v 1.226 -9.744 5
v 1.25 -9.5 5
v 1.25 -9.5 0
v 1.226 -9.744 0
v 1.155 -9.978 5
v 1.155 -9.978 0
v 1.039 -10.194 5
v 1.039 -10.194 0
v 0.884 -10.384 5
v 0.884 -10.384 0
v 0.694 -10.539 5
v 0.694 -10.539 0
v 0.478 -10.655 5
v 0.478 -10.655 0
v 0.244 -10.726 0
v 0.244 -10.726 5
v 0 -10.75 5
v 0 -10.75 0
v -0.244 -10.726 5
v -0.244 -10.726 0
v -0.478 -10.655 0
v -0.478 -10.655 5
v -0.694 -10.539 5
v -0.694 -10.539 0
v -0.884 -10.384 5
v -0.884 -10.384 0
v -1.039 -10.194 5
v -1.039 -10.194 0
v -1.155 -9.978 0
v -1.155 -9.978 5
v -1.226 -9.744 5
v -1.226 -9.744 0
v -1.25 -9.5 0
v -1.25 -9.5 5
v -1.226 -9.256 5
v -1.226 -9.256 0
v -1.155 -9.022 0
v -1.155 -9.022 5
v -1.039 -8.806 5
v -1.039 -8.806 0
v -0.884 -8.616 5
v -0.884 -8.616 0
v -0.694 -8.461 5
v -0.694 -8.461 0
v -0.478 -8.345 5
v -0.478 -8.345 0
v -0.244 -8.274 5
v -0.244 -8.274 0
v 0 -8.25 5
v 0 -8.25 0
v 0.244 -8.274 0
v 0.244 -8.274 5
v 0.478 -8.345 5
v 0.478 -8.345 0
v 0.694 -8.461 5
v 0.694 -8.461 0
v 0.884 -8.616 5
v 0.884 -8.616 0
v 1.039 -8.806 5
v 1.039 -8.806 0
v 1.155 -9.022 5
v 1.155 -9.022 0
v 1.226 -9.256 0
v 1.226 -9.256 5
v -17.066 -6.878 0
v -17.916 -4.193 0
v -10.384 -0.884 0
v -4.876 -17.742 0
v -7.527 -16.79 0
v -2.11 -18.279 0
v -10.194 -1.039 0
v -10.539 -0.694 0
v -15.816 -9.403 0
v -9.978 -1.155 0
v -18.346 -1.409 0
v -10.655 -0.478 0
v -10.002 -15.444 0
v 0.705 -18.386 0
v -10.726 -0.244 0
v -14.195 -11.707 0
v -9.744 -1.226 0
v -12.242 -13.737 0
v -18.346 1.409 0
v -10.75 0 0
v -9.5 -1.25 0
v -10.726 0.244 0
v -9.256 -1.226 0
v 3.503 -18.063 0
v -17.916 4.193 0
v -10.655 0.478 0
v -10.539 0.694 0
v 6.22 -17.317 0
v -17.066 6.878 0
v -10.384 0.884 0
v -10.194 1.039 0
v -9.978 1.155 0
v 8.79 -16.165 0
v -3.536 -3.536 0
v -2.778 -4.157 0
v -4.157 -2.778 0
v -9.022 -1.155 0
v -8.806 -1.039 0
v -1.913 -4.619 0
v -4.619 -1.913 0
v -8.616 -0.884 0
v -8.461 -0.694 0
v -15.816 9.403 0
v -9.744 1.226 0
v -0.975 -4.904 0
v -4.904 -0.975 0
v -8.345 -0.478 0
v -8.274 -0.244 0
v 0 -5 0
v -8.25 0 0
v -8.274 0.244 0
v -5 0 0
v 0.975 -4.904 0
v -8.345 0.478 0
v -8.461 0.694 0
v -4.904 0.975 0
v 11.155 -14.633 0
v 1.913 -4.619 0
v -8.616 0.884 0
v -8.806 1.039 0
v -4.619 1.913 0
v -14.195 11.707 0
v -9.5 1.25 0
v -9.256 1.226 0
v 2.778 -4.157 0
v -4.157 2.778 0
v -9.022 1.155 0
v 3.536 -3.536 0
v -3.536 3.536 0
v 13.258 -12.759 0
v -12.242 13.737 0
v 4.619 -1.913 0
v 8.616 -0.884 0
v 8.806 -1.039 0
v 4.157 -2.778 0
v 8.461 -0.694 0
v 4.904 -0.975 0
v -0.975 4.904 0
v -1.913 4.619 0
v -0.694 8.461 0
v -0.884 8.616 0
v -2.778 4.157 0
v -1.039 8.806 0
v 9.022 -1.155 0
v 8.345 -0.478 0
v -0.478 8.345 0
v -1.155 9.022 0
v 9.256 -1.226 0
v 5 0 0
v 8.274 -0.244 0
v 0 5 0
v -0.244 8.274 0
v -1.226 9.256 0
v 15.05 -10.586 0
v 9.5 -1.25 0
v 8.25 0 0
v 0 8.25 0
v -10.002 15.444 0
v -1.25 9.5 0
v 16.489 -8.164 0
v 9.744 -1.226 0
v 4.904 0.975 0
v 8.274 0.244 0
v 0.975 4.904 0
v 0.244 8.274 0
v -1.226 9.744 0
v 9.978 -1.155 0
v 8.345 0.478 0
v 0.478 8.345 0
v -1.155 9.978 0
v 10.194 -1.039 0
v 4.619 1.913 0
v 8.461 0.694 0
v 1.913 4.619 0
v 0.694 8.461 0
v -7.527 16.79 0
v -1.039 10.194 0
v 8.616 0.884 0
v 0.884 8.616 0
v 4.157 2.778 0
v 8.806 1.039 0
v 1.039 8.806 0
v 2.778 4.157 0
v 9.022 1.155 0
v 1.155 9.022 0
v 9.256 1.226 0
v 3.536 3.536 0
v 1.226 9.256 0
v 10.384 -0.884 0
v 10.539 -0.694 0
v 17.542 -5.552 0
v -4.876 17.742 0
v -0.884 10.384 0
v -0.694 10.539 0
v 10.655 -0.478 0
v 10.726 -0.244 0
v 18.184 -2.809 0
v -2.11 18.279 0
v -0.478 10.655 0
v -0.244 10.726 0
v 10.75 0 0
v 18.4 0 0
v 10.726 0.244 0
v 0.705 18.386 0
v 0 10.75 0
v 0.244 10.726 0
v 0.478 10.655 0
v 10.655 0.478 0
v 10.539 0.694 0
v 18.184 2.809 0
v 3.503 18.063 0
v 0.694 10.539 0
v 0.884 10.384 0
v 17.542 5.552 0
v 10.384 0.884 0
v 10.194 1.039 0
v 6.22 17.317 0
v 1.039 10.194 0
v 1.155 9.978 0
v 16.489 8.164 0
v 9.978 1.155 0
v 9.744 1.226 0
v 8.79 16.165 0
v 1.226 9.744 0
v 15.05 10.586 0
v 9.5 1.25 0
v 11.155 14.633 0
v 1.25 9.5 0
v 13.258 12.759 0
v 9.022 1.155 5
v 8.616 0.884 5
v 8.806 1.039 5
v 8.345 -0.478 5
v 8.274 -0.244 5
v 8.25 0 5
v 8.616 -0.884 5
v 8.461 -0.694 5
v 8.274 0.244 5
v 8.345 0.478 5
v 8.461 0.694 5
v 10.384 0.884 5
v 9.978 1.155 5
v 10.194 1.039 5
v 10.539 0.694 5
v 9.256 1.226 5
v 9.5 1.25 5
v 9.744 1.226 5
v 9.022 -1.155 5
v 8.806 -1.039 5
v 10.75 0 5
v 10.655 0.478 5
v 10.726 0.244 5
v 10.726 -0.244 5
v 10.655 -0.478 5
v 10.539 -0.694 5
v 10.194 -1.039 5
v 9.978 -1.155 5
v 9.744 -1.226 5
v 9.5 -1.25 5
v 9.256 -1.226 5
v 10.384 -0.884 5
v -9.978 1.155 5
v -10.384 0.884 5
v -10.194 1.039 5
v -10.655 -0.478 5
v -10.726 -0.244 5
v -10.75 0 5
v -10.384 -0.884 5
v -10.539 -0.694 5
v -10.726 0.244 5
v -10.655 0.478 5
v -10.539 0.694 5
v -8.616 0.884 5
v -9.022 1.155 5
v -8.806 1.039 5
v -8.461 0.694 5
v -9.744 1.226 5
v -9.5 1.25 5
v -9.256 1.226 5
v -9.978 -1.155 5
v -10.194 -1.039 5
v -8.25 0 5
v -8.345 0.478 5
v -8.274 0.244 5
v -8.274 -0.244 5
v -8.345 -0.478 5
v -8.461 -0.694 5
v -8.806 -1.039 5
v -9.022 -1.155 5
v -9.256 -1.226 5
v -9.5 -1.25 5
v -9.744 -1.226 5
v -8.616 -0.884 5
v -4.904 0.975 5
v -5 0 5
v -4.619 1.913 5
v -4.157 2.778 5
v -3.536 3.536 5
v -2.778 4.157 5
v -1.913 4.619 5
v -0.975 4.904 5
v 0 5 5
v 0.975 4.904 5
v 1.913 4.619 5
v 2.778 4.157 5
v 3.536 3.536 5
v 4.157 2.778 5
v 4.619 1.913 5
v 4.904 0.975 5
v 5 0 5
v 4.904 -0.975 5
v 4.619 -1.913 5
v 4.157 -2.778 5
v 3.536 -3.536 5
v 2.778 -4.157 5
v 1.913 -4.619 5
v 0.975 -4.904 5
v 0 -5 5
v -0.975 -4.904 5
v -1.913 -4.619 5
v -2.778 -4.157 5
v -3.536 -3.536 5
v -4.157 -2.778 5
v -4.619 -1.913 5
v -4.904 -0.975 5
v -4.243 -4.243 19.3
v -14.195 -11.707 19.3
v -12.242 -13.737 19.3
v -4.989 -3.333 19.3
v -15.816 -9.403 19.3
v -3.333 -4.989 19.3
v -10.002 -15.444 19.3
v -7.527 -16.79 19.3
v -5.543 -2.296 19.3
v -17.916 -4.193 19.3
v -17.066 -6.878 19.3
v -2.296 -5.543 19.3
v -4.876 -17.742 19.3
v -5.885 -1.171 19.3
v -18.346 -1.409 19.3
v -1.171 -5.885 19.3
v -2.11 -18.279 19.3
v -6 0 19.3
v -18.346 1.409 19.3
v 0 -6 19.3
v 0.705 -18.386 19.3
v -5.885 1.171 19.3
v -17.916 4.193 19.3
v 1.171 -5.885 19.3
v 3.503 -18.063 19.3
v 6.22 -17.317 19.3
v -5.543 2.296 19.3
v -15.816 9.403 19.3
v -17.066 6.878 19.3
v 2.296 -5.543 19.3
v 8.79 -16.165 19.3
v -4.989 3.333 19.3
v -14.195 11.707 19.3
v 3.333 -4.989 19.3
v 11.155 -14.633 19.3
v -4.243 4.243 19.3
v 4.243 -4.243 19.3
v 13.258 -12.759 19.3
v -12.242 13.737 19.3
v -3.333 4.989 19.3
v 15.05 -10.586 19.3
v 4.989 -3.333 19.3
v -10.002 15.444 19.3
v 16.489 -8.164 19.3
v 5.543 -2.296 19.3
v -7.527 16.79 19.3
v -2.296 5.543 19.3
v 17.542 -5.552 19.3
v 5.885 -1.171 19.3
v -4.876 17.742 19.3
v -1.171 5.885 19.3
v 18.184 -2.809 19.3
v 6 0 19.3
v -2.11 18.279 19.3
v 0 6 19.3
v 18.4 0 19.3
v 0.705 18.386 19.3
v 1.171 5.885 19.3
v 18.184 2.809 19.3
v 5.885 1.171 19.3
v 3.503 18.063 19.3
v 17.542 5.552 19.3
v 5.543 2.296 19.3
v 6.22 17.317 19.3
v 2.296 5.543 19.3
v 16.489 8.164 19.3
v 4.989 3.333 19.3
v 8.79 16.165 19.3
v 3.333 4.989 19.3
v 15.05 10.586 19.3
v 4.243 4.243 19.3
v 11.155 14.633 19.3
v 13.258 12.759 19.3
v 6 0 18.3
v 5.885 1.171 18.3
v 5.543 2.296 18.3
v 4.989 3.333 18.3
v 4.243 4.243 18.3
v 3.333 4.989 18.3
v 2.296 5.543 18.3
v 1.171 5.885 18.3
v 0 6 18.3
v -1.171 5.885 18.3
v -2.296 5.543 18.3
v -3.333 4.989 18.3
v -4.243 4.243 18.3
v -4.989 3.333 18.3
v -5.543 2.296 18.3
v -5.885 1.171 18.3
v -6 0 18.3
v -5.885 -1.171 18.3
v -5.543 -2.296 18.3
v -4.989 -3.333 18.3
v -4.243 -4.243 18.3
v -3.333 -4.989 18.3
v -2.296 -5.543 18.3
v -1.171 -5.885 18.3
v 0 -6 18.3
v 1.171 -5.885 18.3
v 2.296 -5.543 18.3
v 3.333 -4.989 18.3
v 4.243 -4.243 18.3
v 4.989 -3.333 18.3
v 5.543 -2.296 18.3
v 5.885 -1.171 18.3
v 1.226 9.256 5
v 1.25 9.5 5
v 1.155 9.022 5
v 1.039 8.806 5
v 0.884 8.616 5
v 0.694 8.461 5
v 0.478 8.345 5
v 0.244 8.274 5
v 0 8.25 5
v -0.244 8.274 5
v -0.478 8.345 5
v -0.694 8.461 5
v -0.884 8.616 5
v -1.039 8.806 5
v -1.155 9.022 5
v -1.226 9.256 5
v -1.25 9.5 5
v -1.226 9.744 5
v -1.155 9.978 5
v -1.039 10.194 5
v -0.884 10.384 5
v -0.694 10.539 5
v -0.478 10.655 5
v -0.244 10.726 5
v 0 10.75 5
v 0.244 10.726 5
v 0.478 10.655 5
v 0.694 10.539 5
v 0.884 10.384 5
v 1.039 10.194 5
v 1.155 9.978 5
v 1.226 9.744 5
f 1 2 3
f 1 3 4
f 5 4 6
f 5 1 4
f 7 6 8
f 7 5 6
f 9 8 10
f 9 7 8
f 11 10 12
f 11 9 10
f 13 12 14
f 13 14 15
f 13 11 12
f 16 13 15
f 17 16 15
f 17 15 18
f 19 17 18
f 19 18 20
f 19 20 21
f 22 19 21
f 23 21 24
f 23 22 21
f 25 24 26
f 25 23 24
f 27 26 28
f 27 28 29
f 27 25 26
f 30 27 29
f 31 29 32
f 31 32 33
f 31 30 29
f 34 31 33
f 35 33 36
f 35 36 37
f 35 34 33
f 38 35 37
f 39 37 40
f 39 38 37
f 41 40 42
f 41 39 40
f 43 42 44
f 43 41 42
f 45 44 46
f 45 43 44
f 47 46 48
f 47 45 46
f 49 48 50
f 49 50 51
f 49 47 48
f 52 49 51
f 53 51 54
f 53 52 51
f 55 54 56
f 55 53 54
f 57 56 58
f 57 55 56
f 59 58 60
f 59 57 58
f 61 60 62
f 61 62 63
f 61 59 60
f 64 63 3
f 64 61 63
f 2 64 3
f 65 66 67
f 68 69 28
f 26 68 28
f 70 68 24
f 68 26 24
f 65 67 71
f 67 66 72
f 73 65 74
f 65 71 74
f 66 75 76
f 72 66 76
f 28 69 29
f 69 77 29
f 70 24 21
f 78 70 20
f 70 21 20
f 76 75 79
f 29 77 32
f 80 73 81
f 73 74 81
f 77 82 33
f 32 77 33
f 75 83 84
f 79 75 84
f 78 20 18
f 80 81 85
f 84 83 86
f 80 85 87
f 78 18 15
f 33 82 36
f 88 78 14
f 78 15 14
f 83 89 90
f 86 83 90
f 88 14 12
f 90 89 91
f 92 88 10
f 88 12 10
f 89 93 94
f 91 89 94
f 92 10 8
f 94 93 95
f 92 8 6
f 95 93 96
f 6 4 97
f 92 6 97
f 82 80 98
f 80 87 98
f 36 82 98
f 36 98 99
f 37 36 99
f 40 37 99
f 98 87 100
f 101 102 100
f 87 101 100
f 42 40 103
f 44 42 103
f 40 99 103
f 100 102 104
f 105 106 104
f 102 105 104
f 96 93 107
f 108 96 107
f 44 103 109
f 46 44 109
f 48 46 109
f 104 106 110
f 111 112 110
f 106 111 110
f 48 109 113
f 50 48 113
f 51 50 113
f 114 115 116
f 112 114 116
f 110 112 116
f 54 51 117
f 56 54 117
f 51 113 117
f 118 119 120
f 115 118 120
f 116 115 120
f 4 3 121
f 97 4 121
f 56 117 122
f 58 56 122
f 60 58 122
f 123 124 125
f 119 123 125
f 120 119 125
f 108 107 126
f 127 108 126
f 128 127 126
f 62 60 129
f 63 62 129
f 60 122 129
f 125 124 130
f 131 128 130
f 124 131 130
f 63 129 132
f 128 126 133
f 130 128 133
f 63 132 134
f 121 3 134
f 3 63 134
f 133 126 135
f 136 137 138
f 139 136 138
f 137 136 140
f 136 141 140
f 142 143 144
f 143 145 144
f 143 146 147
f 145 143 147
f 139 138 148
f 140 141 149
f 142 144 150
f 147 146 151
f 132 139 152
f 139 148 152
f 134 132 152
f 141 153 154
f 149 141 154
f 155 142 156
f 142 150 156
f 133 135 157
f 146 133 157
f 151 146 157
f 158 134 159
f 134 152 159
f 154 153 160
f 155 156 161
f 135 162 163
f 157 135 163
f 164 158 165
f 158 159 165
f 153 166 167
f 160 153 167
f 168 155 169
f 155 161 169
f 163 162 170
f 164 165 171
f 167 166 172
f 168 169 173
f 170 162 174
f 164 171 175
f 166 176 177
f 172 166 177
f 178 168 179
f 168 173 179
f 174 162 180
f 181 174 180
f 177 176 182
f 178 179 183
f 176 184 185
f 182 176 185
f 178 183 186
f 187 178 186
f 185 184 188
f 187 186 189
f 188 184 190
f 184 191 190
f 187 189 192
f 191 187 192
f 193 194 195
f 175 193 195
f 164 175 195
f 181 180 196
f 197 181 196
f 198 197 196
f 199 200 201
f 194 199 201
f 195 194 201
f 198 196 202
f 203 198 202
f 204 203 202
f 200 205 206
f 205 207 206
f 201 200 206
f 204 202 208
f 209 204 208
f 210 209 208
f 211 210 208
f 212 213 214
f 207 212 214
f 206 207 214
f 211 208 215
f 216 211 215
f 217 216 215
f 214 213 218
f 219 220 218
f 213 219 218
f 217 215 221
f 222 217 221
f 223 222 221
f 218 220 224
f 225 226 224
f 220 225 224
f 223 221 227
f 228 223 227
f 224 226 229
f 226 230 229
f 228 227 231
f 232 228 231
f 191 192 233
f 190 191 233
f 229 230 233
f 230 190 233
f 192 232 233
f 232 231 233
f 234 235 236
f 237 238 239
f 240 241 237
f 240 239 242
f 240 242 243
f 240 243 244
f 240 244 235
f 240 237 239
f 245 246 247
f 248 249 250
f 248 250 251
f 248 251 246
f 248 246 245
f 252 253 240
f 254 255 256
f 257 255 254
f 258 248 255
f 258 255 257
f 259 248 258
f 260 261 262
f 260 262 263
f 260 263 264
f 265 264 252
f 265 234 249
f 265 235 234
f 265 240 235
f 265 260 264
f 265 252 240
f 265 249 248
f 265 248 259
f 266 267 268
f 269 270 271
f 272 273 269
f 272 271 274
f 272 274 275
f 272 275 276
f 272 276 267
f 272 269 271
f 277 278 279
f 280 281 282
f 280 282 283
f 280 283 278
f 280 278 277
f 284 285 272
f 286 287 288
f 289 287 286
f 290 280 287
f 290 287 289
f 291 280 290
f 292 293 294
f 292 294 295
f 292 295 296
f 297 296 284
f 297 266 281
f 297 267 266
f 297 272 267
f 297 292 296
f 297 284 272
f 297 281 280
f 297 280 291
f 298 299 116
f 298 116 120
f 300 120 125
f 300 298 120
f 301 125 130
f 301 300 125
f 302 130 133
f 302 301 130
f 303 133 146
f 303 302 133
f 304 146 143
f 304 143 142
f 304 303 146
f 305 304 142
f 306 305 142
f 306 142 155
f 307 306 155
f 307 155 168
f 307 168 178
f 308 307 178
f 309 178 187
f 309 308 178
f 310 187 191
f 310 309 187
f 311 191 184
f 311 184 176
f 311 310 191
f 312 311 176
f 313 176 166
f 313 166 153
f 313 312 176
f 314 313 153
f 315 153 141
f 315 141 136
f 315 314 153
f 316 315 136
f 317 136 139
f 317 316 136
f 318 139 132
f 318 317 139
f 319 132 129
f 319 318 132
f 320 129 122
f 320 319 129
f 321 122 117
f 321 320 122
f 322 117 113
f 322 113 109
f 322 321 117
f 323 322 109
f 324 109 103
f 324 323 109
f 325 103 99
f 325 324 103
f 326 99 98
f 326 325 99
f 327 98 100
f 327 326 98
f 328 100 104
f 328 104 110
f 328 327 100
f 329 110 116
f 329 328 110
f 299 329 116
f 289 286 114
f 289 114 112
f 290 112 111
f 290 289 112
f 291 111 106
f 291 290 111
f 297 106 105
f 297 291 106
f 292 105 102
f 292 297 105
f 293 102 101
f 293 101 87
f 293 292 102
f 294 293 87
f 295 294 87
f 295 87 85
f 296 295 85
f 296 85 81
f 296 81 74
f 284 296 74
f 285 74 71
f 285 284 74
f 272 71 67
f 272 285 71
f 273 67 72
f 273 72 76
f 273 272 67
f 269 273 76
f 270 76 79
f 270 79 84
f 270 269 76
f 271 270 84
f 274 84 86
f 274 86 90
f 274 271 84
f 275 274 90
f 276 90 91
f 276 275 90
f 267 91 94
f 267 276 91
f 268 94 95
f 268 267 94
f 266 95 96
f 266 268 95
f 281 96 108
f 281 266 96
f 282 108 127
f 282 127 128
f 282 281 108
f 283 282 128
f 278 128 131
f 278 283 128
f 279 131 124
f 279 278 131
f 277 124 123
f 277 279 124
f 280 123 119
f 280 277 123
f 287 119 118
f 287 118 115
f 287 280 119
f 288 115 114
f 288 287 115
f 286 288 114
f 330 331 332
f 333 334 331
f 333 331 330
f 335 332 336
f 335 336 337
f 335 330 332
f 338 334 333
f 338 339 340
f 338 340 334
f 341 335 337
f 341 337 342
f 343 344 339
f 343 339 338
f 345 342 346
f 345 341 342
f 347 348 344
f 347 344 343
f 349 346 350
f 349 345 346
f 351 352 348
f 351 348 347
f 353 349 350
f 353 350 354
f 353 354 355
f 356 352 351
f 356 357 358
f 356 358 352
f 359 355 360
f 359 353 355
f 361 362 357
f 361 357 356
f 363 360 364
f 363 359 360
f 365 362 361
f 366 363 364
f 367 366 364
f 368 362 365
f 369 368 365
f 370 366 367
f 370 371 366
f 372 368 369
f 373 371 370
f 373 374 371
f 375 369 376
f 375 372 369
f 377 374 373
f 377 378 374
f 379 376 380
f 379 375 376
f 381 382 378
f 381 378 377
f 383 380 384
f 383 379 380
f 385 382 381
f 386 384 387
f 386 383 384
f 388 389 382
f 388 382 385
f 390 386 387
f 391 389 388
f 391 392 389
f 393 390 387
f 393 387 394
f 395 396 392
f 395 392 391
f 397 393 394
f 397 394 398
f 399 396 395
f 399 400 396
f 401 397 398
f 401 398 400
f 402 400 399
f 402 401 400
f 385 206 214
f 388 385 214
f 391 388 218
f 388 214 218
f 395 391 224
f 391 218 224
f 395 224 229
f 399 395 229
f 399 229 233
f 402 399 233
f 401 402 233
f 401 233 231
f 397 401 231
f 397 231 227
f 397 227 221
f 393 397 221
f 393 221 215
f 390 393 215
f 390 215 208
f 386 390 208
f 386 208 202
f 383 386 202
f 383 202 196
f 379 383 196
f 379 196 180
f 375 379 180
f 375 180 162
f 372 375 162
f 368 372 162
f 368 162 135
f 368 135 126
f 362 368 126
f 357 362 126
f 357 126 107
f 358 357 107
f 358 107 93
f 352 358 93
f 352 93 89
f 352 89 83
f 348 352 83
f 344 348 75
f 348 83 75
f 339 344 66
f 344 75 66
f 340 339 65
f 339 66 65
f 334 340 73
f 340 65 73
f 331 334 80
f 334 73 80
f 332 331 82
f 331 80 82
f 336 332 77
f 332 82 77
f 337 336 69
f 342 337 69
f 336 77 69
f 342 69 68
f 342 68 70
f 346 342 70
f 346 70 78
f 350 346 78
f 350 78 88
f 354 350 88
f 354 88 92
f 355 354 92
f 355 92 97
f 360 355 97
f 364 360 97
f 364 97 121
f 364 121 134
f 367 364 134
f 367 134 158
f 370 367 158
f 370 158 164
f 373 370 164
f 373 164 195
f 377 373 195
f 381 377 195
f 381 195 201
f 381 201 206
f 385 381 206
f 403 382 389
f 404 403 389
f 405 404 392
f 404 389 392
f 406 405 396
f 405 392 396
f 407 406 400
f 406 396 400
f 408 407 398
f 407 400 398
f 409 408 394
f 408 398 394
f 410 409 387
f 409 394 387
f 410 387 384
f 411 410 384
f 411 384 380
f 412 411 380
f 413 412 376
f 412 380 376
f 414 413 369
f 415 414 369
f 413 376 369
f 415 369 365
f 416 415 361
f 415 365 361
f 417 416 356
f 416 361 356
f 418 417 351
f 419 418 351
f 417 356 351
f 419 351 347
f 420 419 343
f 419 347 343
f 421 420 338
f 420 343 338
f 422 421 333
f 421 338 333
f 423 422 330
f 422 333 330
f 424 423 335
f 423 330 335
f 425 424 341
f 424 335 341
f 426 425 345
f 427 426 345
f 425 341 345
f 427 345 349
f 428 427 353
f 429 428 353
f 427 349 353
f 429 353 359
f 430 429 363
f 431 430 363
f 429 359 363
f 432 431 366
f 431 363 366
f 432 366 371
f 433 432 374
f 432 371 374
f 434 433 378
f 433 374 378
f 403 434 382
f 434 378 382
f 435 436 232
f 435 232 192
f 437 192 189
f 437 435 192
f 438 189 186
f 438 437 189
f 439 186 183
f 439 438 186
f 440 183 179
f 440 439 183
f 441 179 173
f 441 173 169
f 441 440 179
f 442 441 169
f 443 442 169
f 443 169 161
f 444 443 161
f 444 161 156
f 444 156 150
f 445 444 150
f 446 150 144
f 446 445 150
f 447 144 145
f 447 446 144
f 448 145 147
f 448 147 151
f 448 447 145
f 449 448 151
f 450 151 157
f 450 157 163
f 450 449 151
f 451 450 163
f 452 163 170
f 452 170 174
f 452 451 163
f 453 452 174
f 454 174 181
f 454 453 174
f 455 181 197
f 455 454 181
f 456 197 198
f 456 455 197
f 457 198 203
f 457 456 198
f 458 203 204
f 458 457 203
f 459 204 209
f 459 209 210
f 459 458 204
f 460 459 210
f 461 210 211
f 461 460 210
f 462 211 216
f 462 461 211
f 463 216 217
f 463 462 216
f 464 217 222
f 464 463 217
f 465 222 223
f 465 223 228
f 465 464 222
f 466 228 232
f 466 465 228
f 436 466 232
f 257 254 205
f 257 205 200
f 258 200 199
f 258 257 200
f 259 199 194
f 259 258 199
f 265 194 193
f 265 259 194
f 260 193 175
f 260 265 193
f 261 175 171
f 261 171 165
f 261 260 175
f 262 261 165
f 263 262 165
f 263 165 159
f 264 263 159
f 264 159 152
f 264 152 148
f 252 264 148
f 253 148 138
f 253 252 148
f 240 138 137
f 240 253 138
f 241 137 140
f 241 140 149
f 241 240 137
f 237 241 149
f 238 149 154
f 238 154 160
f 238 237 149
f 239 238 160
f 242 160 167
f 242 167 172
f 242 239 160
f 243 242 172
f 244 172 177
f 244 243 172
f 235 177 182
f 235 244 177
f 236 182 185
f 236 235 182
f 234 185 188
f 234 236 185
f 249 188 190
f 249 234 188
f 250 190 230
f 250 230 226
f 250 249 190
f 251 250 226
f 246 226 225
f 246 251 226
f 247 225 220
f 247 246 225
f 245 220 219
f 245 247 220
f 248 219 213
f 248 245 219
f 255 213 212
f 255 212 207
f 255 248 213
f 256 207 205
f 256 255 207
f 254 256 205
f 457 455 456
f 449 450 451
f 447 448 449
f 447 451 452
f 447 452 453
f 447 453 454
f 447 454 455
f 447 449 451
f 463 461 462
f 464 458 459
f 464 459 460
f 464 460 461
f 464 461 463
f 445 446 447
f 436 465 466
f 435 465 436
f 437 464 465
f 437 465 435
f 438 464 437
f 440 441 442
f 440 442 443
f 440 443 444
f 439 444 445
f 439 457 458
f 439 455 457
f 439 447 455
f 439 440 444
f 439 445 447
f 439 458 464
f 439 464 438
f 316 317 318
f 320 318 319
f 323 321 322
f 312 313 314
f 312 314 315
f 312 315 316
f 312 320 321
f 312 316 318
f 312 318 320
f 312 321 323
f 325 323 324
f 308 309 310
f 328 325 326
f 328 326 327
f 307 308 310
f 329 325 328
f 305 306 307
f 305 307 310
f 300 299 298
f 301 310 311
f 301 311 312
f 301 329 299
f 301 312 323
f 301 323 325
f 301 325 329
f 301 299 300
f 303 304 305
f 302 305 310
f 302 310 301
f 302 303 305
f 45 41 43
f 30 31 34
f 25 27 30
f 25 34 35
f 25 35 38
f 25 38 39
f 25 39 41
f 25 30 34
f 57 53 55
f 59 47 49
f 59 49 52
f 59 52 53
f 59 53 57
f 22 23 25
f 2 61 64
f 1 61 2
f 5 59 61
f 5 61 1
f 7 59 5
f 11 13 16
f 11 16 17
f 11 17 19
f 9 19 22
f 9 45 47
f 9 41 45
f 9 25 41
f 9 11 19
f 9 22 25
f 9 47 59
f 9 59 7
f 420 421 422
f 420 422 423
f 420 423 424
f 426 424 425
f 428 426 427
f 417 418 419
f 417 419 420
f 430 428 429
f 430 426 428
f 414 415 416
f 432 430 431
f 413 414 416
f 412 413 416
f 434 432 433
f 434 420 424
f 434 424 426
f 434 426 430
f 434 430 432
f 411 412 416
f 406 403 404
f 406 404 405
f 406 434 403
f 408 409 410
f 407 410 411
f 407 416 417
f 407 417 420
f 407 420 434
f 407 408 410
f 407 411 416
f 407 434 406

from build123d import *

# Parameters (mm, degrees)
CROQUIS1_R              = 18.4
SALIENTE_EXTRUIR1_DEPTH = 24.3
CROQUIS2_R              = 3
CROQUIS2_R_2            = 1.25
CORTAR_EXTRUIR1_DEPTH   = 5
CORTAR_EXTRUIR2_START   = -5
CROQUIS3_R              = 1.25
CROQUIS3_R_2            = 5
CORTAR_EXTRUIR2_DEPTH   = 5
CORTAR_EXTRUIR3_START   = -5
CROQUIS6_R              = 18.4
CORTAR_EXTRUIR3_DEPTH   = 5
CROQUIS7_R              = 6
CORTAR_EXTRUIR4_DEPTH   = 1


with BuildPart() as part:
    # Croquis1 → Saliente-Extruir1 (new body)
    with BuildSketch(Plane.XY):
        Circle(CROQUIS1_R)
    extrude(amount=SALIENTE_EXTRUIR1_DEPTH)

    # Croquis2 → Cortar-Extruir1 (cut)
    with BuildSketch(Plane.XY.offset(24.3)):
        Circle(CROQUIS2_R)
        with Locations((0, 9.5)):
            Circle(CROQUIS2_R_2)
        with Locations((9.5, 0)):
            Circle(CROQUIS2_R_2)
        with Locations((0, -9.5)):
            Circle(CROQUIS2_R_2)
        with Locations((-9.5, 0)):
            Circle(CROQUIS2_R_2)
    extrude(amount=-CORTAR_EXTRUIR1_DEPTH, mode=Mode.SUBTRACT)

    # Croquis3 → Cortar-Extruir2 (cut)
    with BuildSketch(Plane(origin=(0, 0, 0), x_dir=(-1, 0, 0), z_dir=(0, 0, -1)).offset(CORTAR_EXTRUIR2_START)):
        with Locations(Location((-9.5, 0, 0), (0, 0, 180))):
            Circle(CROQUIS3_R)
        with Locations(Location((0, 9.5, 0), (0, 0, 180))):
            Circle(CROQUIS3_R)
        with Locations(Location((9.5, 0, 0), (0, 0, 180))):
            Circle(CROQUIS3_R)
        with Locations(Location((0, -9.5, 0), (0, 0, 180))):
            Circle(CROQUIS3_R)
        Circle(CROQUIS3_R_2)
    extrude(amount=CORTAR_EXTRUIR2_DEPTH, mode=Mode.SUBTRACT)

    # Croquis6 → Cortar-Extruir3 (cut)
    with BuildSketch(Plane.XY.offset(24.3).offset(CORTAR_EXTRUIR3_START)):
        Circle(CROQUIS6_R)
    extrude(amount=CORTAR_EXTRUIR3_DEPTH, mode=Mode.SUBTRACT)

    # Croquis7 → Cortar-Extruir4 (cut)
    with BuildSketch(Plane.XY.offset(19.3)):
        Circle(CROQUIS7_R)
    extrude(amount=-CORTAR_EXTRUIR4_DEPTH, mode=Mode.SUBTRACT)


solid = part.part
